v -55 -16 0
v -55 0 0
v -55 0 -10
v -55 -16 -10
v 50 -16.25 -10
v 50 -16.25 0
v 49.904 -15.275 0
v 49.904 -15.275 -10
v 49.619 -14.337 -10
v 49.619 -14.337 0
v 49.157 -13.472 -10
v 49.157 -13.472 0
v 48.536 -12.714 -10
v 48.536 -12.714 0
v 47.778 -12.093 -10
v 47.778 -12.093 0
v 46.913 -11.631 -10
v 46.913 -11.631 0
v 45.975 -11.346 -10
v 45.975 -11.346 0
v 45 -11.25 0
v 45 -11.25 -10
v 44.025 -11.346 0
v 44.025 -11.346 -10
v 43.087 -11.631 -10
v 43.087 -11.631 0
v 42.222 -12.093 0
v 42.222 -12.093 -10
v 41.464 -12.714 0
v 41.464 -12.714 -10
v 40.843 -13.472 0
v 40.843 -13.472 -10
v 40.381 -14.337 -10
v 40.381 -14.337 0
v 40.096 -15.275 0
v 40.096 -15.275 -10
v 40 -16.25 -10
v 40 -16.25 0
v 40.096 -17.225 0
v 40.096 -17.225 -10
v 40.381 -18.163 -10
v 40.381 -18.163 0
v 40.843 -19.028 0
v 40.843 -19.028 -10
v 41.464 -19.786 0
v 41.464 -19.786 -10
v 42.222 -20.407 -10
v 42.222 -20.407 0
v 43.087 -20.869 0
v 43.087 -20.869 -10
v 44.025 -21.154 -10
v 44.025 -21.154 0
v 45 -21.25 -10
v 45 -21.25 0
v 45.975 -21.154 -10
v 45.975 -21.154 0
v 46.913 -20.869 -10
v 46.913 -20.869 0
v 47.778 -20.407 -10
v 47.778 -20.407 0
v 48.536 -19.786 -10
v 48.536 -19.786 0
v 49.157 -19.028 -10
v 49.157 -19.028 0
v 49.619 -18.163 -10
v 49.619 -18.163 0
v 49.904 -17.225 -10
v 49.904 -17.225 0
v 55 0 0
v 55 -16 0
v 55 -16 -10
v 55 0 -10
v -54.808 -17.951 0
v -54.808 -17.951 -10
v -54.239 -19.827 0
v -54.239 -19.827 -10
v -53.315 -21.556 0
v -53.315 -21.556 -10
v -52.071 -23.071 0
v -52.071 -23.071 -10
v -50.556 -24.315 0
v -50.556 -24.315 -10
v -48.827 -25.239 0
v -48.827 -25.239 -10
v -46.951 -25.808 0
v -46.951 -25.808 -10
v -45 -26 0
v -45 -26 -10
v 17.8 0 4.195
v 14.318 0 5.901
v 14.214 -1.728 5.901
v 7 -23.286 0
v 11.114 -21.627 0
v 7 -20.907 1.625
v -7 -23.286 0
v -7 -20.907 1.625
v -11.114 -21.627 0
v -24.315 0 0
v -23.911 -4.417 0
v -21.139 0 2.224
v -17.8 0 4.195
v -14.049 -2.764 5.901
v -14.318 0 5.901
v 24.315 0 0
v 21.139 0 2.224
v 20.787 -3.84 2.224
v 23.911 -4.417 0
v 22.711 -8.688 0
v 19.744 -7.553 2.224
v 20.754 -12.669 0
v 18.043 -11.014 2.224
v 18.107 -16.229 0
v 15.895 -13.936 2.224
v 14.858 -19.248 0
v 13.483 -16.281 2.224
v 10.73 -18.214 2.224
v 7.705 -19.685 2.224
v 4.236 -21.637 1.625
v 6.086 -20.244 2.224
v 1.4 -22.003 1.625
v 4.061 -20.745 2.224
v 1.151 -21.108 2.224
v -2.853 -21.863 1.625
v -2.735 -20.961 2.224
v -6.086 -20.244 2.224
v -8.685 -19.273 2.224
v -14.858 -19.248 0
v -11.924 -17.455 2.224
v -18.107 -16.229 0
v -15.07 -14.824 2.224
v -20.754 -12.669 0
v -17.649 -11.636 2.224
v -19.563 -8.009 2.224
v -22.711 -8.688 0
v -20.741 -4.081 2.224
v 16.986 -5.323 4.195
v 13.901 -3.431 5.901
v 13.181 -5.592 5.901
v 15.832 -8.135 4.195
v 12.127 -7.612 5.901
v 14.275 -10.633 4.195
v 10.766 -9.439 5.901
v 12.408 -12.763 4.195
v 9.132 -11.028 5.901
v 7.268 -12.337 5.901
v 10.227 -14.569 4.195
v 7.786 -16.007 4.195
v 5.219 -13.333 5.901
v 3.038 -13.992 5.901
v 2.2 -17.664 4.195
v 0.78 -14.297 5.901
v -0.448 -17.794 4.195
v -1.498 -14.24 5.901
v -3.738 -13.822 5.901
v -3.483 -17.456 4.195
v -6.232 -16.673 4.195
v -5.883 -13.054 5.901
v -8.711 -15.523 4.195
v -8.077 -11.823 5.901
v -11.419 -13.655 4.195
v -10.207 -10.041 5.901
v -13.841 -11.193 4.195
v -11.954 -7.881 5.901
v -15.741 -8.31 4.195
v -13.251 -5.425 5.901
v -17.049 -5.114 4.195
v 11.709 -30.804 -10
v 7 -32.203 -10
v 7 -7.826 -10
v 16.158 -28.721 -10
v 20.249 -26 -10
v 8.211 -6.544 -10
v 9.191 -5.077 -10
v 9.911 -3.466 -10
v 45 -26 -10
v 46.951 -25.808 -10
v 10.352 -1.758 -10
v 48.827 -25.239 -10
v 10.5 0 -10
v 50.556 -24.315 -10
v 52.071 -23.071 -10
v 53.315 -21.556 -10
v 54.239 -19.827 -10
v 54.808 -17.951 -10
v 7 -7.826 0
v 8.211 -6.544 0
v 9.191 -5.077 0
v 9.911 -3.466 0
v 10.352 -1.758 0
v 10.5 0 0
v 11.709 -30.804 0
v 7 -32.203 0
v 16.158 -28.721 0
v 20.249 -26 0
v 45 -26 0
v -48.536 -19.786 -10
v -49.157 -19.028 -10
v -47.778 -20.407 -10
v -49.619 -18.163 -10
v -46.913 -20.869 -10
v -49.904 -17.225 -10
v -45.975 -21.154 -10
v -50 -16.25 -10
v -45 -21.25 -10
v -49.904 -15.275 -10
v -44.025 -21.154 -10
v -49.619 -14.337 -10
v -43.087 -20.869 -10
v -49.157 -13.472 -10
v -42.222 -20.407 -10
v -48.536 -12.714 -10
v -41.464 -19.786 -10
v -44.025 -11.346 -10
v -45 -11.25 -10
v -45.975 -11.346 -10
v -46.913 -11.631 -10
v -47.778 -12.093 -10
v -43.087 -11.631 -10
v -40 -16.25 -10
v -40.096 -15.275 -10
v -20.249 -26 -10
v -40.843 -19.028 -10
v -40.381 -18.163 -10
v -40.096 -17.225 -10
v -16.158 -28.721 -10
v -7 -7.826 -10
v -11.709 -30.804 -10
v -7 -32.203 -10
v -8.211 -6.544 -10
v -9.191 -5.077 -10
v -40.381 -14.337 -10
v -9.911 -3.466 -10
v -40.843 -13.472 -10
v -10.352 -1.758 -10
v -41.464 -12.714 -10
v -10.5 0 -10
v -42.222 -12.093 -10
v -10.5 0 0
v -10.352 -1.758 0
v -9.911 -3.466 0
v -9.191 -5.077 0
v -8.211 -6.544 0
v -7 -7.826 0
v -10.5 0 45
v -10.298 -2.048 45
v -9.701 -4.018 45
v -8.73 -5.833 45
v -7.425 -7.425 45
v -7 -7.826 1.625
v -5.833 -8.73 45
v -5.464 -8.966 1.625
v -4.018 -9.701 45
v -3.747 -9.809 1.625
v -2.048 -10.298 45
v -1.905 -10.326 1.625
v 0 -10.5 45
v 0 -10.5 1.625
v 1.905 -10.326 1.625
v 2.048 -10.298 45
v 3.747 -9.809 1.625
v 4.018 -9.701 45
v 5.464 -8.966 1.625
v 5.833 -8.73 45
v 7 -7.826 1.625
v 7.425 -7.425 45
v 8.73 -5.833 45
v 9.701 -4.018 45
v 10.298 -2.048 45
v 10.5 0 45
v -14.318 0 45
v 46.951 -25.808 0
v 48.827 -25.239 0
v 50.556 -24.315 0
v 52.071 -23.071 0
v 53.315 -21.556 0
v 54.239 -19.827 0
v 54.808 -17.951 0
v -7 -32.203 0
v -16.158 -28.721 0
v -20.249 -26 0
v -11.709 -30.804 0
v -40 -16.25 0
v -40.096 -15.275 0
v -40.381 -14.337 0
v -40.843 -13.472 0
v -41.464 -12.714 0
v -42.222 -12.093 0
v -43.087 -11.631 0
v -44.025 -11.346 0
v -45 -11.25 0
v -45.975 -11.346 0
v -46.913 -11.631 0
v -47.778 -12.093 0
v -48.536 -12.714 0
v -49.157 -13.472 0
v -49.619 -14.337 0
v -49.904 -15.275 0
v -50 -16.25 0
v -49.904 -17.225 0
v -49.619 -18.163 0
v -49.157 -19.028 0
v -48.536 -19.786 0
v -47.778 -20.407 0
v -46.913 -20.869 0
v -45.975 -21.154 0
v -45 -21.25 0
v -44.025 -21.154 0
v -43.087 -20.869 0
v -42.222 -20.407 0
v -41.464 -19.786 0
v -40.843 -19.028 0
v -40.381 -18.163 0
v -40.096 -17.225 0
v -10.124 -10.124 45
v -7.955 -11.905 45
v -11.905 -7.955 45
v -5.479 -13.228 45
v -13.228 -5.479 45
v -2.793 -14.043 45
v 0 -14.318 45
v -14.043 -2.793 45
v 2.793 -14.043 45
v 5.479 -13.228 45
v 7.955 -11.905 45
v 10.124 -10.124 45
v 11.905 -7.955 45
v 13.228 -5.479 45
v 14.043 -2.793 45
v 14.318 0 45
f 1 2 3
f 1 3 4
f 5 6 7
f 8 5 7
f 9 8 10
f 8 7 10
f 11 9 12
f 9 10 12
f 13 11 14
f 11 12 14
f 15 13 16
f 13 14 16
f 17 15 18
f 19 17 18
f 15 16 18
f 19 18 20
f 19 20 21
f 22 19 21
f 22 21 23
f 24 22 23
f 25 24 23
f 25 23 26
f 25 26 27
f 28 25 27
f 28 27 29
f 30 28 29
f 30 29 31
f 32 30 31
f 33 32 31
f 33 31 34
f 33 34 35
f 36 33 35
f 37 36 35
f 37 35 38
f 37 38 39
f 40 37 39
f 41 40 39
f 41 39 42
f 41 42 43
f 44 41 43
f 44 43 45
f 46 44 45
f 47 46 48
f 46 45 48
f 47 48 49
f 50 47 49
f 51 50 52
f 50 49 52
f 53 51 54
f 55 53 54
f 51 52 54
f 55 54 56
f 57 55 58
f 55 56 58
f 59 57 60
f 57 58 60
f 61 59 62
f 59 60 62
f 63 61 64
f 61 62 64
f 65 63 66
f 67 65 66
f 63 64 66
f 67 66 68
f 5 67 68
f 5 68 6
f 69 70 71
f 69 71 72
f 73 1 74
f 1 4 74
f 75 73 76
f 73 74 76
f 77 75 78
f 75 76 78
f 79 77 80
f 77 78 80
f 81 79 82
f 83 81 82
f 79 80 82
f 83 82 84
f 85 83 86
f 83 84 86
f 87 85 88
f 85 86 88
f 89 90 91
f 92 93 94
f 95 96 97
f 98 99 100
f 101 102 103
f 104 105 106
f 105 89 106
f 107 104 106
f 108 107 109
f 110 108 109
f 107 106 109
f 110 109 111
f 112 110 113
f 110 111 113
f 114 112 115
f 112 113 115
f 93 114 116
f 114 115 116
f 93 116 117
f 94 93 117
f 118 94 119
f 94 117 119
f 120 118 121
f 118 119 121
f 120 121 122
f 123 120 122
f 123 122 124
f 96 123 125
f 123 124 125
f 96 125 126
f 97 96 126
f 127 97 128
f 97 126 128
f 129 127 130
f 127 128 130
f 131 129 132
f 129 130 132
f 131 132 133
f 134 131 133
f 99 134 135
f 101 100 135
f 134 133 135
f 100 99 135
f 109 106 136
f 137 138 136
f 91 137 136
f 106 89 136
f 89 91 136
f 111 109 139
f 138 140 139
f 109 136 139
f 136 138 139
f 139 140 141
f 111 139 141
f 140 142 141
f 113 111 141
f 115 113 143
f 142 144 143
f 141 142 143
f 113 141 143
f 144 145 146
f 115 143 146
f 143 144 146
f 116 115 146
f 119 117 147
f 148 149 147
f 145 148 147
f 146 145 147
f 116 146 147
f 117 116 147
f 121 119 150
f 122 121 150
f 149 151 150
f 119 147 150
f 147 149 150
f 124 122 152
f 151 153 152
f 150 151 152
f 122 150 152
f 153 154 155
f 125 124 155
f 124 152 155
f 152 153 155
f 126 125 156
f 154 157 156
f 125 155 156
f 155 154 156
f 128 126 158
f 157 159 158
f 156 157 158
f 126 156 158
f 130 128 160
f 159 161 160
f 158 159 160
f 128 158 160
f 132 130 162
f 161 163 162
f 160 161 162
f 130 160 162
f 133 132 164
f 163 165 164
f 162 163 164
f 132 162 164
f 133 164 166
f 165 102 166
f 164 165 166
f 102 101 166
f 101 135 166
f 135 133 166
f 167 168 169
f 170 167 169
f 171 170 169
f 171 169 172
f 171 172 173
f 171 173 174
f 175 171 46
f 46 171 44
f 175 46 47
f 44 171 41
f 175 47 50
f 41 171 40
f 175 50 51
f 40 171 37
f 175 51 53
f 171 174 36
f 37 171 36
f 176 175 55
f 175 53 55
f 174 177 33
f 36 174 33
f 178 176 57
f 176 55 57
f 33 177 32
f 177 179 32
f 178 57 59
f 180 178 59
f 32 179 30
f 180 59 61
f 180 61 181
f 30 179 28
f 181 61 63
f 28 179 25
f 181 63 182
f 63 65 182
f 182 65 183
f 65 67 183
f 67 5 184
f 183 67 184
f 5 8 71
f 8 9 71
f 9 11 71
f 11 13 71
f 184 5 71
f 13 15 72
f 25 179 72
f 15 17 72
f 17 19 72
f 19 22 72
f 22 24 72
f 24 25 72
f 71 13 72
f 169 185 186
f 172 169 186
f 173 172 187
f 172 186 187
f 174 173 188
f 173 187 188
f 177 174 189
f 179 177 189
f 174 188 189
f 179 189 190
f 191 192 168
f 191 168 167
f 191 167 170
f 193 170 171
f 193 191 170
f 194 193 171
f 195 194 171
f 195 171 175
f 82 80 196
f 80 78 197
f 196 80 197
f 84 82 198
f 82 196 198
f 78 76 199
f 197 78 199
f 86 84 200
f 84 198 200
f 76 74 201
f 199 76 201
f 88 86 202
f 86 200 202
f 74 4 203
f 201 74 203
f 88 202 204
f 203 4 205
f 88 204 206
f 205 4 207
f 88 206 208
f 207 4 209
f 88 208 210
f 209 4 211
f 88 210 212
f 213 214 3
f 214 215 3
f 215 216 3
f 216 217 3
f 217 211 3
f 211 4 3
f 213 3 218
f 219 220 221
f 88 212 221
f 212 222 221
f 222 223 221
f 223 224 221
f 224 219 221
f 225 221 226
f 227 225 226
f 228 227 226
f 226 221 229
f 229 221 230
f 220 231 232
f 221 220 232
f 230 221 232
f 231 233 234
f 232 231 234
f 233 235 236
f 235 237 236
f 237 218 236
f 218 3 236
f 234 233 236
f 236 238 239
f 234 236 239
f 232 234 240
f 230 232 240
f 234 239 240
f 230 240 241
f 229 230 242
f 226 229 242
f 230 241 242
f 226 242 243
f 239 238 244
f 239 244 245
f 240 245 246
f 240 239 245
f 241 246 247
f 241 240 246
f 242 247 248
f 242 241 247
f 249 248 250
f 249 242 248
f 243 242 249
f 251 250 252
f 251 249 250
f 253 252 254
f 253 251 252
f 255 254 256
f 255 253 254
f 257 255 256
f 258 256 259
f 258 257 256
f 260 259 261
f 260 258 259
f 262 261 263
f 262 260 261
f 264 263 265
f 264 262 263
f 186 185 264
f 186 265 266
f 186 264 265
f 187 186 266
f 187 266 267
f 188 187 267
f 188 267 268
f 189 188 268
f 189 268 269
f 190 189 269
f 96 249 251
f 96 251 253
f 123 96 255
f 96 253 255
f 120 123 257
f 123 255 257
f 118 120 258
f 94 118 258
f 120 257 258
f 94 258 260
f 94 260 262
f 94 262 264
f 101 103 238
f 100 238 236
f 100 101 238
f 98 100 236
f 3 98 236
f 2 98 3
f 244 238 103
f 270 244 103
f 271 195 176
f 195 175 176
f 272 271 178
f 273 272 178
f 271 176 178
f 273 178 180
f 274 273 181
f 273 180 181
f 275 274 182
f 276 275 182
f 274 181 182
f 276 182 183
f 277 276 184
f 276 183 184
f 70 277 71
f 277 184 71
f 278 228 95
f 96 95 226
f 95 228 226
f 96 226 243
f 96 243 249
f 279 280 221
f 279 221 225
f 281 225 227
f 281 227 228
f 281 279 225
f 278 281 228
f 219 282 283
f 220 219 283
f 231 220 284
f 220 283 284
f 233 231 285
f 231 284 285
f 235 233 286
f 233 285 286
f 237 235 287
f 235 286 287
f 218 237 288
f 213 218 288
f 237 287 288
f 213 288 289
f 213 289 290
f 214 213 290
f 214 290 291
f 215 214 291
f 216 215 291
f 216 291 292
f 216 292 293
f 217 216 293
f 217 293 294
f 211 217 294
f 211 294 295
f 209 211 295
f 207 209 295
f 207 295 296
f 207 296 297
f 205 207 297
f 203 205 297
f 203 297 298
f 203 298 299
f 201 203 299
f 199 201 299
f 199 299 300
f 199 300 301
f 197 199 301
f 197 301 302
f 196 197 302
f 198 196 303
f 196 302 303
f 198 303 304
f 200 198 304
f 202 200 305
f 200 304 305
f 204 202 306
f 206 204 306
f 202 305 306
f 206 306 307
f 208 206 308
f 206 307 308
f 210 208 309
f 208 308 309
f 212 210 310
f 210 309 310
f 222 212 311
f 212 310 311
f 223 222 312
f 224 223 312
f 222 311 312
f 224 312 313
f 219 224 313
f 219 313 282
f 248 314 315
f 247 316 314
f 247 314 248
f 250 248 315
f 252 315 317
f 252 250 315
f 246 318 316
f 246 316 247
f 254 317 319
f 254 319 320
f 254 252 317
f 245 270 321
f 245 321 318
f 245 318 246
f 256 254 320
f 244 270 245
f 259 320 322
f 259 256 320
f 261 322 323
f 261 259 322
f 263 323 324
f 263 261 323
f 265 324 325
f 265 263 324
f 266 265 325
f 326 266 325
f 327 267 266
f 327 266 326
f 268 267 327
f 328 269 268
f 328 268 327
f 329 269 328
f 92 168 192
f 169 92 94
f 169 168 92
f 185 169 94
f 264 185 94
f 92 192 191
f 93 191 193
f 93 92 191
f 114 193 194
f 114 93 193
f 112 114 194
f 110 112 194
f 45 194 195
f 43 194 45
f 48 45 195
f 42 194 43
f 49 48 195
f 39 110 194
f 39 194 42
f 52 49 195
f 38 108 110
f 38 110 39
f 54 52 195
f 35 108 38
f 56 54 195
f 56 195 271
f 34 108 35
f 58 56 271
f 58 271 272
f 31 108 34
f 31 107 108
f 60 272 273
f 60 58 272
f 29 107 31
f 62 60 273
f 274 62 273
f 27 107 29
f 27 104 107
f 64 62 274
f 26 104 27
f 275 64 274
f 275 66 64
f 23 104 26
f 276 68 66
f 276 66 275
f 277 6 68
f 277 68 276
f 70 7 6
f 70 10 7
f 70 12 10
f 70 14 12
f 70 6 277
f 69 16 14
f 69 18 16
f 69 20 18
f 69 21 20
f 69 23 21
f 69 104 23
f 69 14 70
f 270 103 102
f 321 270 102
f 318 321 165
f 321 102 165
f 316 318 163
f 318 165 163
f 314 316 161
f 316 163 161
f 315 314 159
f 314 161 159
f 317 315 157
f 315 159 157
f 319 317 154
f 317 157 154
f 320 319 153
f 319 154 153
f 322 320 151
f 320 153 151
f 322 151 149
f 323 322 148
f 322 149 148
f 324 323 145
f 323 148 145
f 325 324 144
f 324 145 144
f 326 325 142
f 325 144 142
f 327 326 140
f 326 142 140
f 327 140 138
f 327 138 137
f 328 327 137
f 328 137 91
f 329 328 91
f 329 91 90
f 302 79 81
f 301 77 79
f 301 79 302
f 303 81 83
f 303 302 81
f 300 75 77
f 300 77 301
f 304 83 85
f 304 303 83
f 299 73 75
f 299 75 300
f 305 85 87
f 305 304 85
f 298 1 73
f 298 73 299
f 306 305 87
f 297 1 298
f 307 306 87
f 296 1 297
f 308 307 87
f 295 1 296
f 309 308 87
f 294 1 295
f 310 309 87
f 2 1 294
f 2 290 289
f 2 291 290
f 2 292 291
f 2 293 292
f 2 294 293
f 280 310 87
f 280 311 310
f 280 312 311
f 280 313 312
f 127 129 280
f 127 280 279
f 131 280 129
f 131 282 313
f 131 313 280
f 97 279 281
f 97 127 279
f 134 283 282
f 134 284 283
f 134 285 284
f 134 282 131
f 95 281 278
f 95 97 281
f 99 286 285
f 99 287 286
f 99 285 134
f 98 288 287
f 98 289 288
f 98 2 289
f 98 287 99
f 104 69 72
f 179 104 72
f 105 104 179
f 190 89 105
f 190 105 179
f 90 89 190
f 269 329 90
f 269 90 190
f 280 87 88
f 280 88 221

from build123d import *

# Parameters (mm, degrees)
F1_DEPTH       = 10
F2_R           = 10
F3_R           = 5
F4_DEPTH       = 25
F6_ANGLE       = 180
F8_DEPTH       = 45
F9_R           = 10.5
F10_DEPTH      = 50
F10_DEPTH_BACK = 50
F11_W          = 14
F11_H          = 25.2948729652
F12_DEPTH      = 50


with BuildPart() as f1:
    # F0 (on Top) → F1 (new body)
    with BuildSketch(Plane.XY):
        with BuildLine():
            Line((-32.9545475543, 0), (-55, 0))
            Line((-55, 0), (-55, -26))
            Line((-55, -26), (-20.2485111676, -26))
            ThreePointArc((-20.2485111676, -26), (-29.6081300379, -14.4693068308), (-32.9545475543, 0))
        make_face()
        with BuildLine():
            Line((32.9545475543, 0), (-32.9545475543, 0))
            ThreePointArc((-32.9545475543, 0), (-29.6081300379, -14.4693068308), (-20.2485111676, -26))
            Line((-20.2485111676, -26), (20.2485111676, -26))
            ThreePointArc((20.2485111676, -26), (29.6081300379, -14.4693068308), (32.9545475543, 0))
        make_face()
        with BuildLine():
            Line((55, 0), (32.9545475543, 0))
            ThreePointArc((32.9545475543, 0), (29.6081300379, -14.4693068308), (20.2485111676, -26))
            Line((20.2485111676, -26), (55, -26))
            Line((55, -26), (55, 0))
        make_face()
        with BuildLine():
            Line((20.2485111676, -26), (-20.2485111676, -26))
            ThreePointArc((-20.2485111676, -26), (0, -32.9545475543), (20.2485111676, -26))
        make_face()
    extrude(amount=-F1_DEPTH)

    # F2
    f2_edges = [f1.edges().sort_by_distance(p)[0] for p in [
        (-55, -26, -5),
        (55, -26, -5),
    ]]
    fillet(f2_edges, radius=F2_R)

    # F3 (on Top) → F4 (cut)
    with BuildSketch(Plane.XY):
        with Locations((-45, -16.2500012666)):
            Circle(F3_R)
        with Locations((45, -16.2500012666)):
            Circle(F3_R)
    extrude(amount=-F4_DEPTH, mode=Mode.SUBTRACT)

    # F5 (on Front) → F6 (revolve)
    with BuildSketch(Plane.XZ):
        with BuildLine():
            Line((0, 9.8314080073), (0, 0))
            Line((0, 0), (24.3154959095, 0))
            ThreePointArc((24.3154959095, 0), (12.8138743622, 6.5384663753), (0, 9.8314080073))
        make_face()
    revolve(axis=Axis((0, 0, 4.9157040036), (0, 0, -1)), revolution_arc=F6_ANGLE)

    # F7 (on Top) → F8 (join)
    with BuildSketch(Plane.XY):
        with BuildLine():
            ThreePointArc((-14.3181821331, 0), (0, -14.3181821331), (14.3181821331, 0))
            Line((14.3181821331, 0), (-14.3181821331, 0))
        make_face()
    extrude(amount=F8_DEPTH)

    # F9 (on Top) → F10 (cut, two sides)
    with BuildSketch(Plane.XY) as f10_sk:
        Circle(F9_R)
    extrude(amount=-F10_DEPTH, mode=Mode.SUBTRACT)
    extrude(f10_sk.sketch, amount=F10_DEPTH_BACK, mode=Mode.SUBTRACT)

    # F11 (on Front) → F12 (cut)
    with BuildSketch(Plane.XZ):
        with Locations((0, -11.0227272962)):
            Rectangle(F11_W, F11_H)
    extrude(amount=F12_DEPTH, mode=Mode.SUBTRACT)


solid = f1.part
